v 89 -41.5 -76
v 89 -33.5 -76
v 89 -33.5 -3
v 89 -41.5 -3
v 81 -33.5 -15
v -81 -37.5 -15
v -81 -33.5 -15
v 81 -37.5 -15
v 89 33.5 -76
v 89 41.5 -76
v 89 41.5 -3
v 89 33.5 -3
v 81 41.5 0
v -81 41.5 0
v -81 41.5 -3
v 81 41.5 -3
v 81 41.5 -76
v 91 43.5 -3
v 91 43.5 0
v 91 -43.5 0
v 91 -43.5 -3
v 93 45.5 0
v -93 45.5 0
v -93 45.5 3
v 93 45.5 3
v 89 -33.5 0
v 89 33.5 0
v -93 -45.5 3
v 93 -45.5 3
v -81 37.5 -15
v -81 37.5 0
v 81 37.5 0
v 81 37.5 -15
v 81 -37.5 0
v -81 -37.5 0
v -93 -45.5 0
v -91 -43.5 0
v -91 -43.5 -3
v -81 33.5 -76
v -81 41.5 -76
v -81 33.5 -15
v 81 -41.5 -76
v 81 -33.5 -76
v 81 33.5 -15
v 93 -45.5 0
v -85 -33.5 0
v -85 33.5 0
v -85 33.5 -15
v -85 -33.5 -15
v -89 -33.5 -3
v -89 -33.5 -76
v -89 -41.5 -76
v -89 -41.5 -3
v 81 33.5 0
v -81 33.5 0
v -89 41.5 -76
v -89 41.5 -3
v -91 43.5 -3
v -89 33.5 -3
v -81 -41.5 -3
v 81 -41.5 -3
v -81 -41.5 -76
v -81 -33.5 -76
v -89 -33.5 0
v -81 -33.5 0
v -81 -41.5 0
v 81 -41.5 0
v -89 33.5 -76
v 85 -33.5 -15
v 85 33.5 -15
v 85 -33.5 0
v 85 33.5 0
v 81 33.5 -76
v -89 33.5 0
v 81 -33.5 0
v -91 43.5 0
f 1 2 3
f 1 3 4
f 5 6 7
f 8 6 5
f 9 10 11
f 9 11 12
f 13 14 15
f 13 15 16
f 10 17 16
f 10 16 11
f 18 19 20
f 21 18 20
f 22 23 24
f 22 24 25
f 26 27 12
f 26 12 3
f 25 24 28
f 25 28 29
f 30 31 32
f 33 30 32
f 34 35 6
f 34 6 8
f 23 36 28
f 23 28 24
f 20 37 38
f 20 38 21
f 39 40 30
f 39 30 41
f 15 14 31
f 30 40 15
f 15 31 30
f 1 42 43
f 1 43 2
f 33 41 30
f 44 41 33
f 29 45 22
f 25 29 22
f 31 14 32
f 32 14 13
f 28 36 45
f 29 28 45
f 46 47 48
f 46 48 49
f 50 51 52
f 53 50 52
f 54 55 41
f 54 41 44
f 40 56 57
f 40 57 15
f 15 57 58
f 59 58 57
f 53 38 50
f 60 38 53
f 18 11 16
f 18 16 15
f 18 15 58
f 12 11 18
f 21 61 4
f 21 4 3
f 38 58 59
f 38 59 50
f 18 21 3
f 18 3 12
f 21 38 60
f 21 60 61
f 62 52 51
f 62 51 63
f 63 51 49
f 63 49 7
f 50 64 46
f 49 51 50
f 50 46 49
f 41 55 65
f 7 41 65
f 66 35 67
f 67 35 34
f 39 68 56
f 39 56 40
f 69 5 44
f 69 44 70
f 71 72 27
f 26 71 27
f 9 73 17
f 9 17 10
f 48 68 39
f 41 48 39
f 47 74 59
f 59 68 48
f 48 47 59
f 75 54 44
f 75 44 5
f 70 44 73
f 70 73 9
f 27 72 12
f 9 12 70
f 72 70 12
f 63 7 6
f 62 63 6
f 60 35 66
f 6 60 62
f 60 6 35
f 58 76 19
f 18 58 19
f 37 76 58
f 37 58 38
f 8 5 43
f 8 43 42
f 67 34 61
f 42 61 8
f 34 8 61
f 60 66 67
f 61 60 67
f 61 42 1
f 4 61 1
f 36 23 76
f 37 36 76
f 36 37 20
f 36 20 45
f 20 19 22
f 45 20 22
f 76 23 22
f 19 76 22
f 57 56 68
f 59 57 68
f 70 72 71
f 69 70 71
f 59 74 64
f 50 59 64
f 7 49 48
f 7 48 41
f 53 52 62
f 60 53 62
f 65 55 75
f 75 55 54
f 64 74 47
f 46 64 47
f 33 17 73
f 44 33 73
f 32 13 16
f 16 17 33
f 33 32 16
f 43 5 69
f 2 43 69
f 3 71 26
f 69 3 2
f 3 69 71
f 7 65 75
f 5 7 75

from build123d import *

# Parameters (mm, degrees)
F0_W     = 186
F0_H     = 91
F1_DEPTH = 3
F2_W     = 182
F2_H     = 87
F2_W_2   = 178
F2_H_2   = 83
F3_DEPTH = 3
F4_W     = 8
F4_H     = 8
F5_DEPTH = 76
F6_W     = 4
F6_H     = 67
F6_W_2   = 162
F6_H_2   = 4
F7_DEPTH = 15


with BuildPart() as f1:
    # F0 (on Top) → F1 (new body)
    with BuildSketch(Plane.XY):
        Rectangle(F0_W, F0_H)
    extrude(amount=F1_DEPTH)

    # F2 (on face) → F3 (join)
    with BuildSketch(Plane(origin=(0, 0, 0), x_dir=(1, 0, 0), z_dir=(0, 0, -1))):
        Rectangle(F2_W, F2_H)
        Rectangle(F2_W_2, F2_H_2, mode=Mode.SUBTRACT)
    extrude(amount=F3_DEPTH)

    # F4 (on face) → F5 (join)
    with BuildSketch(Plane(origin=(0, 0, 0), x_dir=(1, 0, 0), z_dir=(0, 0, -1))):
        with Locations((-85, 37.5)):
            Rectangle(F4_W, F4_H)
        with Locations((-85, -37.5)):
            Rectangle(F4_W, F4_H)
        with Locations((85, 37.5)):
            Rectangle(F4_W, F4_H)
        with Locations((85, -37.5)):
            Rectangle(F4_W, F4_H)
    extrude(amount=F5_DEPTH)

    # F6 (on face) → F7 (join)
    with BuildSketch(Plane(origin=(0, 0, 0), x_dir=(1, 0, 0), z_dir=(0, 0, -1))):
        with Locations((83, 0)):
            Rectangle(F6_W, F6_H)
        with Locations((0, -35.5)):
            Rectangle(F6_W_2, F6_H_2)
        with Locations((-83, 0)):
            Rectangle(F6_W, F6_H)
        with Locations((0, 35.5)):
            Rectangle(F6_W_2, F6_H_2)
    extrude(amount=F7_DEPTH)


solid = f1.part
